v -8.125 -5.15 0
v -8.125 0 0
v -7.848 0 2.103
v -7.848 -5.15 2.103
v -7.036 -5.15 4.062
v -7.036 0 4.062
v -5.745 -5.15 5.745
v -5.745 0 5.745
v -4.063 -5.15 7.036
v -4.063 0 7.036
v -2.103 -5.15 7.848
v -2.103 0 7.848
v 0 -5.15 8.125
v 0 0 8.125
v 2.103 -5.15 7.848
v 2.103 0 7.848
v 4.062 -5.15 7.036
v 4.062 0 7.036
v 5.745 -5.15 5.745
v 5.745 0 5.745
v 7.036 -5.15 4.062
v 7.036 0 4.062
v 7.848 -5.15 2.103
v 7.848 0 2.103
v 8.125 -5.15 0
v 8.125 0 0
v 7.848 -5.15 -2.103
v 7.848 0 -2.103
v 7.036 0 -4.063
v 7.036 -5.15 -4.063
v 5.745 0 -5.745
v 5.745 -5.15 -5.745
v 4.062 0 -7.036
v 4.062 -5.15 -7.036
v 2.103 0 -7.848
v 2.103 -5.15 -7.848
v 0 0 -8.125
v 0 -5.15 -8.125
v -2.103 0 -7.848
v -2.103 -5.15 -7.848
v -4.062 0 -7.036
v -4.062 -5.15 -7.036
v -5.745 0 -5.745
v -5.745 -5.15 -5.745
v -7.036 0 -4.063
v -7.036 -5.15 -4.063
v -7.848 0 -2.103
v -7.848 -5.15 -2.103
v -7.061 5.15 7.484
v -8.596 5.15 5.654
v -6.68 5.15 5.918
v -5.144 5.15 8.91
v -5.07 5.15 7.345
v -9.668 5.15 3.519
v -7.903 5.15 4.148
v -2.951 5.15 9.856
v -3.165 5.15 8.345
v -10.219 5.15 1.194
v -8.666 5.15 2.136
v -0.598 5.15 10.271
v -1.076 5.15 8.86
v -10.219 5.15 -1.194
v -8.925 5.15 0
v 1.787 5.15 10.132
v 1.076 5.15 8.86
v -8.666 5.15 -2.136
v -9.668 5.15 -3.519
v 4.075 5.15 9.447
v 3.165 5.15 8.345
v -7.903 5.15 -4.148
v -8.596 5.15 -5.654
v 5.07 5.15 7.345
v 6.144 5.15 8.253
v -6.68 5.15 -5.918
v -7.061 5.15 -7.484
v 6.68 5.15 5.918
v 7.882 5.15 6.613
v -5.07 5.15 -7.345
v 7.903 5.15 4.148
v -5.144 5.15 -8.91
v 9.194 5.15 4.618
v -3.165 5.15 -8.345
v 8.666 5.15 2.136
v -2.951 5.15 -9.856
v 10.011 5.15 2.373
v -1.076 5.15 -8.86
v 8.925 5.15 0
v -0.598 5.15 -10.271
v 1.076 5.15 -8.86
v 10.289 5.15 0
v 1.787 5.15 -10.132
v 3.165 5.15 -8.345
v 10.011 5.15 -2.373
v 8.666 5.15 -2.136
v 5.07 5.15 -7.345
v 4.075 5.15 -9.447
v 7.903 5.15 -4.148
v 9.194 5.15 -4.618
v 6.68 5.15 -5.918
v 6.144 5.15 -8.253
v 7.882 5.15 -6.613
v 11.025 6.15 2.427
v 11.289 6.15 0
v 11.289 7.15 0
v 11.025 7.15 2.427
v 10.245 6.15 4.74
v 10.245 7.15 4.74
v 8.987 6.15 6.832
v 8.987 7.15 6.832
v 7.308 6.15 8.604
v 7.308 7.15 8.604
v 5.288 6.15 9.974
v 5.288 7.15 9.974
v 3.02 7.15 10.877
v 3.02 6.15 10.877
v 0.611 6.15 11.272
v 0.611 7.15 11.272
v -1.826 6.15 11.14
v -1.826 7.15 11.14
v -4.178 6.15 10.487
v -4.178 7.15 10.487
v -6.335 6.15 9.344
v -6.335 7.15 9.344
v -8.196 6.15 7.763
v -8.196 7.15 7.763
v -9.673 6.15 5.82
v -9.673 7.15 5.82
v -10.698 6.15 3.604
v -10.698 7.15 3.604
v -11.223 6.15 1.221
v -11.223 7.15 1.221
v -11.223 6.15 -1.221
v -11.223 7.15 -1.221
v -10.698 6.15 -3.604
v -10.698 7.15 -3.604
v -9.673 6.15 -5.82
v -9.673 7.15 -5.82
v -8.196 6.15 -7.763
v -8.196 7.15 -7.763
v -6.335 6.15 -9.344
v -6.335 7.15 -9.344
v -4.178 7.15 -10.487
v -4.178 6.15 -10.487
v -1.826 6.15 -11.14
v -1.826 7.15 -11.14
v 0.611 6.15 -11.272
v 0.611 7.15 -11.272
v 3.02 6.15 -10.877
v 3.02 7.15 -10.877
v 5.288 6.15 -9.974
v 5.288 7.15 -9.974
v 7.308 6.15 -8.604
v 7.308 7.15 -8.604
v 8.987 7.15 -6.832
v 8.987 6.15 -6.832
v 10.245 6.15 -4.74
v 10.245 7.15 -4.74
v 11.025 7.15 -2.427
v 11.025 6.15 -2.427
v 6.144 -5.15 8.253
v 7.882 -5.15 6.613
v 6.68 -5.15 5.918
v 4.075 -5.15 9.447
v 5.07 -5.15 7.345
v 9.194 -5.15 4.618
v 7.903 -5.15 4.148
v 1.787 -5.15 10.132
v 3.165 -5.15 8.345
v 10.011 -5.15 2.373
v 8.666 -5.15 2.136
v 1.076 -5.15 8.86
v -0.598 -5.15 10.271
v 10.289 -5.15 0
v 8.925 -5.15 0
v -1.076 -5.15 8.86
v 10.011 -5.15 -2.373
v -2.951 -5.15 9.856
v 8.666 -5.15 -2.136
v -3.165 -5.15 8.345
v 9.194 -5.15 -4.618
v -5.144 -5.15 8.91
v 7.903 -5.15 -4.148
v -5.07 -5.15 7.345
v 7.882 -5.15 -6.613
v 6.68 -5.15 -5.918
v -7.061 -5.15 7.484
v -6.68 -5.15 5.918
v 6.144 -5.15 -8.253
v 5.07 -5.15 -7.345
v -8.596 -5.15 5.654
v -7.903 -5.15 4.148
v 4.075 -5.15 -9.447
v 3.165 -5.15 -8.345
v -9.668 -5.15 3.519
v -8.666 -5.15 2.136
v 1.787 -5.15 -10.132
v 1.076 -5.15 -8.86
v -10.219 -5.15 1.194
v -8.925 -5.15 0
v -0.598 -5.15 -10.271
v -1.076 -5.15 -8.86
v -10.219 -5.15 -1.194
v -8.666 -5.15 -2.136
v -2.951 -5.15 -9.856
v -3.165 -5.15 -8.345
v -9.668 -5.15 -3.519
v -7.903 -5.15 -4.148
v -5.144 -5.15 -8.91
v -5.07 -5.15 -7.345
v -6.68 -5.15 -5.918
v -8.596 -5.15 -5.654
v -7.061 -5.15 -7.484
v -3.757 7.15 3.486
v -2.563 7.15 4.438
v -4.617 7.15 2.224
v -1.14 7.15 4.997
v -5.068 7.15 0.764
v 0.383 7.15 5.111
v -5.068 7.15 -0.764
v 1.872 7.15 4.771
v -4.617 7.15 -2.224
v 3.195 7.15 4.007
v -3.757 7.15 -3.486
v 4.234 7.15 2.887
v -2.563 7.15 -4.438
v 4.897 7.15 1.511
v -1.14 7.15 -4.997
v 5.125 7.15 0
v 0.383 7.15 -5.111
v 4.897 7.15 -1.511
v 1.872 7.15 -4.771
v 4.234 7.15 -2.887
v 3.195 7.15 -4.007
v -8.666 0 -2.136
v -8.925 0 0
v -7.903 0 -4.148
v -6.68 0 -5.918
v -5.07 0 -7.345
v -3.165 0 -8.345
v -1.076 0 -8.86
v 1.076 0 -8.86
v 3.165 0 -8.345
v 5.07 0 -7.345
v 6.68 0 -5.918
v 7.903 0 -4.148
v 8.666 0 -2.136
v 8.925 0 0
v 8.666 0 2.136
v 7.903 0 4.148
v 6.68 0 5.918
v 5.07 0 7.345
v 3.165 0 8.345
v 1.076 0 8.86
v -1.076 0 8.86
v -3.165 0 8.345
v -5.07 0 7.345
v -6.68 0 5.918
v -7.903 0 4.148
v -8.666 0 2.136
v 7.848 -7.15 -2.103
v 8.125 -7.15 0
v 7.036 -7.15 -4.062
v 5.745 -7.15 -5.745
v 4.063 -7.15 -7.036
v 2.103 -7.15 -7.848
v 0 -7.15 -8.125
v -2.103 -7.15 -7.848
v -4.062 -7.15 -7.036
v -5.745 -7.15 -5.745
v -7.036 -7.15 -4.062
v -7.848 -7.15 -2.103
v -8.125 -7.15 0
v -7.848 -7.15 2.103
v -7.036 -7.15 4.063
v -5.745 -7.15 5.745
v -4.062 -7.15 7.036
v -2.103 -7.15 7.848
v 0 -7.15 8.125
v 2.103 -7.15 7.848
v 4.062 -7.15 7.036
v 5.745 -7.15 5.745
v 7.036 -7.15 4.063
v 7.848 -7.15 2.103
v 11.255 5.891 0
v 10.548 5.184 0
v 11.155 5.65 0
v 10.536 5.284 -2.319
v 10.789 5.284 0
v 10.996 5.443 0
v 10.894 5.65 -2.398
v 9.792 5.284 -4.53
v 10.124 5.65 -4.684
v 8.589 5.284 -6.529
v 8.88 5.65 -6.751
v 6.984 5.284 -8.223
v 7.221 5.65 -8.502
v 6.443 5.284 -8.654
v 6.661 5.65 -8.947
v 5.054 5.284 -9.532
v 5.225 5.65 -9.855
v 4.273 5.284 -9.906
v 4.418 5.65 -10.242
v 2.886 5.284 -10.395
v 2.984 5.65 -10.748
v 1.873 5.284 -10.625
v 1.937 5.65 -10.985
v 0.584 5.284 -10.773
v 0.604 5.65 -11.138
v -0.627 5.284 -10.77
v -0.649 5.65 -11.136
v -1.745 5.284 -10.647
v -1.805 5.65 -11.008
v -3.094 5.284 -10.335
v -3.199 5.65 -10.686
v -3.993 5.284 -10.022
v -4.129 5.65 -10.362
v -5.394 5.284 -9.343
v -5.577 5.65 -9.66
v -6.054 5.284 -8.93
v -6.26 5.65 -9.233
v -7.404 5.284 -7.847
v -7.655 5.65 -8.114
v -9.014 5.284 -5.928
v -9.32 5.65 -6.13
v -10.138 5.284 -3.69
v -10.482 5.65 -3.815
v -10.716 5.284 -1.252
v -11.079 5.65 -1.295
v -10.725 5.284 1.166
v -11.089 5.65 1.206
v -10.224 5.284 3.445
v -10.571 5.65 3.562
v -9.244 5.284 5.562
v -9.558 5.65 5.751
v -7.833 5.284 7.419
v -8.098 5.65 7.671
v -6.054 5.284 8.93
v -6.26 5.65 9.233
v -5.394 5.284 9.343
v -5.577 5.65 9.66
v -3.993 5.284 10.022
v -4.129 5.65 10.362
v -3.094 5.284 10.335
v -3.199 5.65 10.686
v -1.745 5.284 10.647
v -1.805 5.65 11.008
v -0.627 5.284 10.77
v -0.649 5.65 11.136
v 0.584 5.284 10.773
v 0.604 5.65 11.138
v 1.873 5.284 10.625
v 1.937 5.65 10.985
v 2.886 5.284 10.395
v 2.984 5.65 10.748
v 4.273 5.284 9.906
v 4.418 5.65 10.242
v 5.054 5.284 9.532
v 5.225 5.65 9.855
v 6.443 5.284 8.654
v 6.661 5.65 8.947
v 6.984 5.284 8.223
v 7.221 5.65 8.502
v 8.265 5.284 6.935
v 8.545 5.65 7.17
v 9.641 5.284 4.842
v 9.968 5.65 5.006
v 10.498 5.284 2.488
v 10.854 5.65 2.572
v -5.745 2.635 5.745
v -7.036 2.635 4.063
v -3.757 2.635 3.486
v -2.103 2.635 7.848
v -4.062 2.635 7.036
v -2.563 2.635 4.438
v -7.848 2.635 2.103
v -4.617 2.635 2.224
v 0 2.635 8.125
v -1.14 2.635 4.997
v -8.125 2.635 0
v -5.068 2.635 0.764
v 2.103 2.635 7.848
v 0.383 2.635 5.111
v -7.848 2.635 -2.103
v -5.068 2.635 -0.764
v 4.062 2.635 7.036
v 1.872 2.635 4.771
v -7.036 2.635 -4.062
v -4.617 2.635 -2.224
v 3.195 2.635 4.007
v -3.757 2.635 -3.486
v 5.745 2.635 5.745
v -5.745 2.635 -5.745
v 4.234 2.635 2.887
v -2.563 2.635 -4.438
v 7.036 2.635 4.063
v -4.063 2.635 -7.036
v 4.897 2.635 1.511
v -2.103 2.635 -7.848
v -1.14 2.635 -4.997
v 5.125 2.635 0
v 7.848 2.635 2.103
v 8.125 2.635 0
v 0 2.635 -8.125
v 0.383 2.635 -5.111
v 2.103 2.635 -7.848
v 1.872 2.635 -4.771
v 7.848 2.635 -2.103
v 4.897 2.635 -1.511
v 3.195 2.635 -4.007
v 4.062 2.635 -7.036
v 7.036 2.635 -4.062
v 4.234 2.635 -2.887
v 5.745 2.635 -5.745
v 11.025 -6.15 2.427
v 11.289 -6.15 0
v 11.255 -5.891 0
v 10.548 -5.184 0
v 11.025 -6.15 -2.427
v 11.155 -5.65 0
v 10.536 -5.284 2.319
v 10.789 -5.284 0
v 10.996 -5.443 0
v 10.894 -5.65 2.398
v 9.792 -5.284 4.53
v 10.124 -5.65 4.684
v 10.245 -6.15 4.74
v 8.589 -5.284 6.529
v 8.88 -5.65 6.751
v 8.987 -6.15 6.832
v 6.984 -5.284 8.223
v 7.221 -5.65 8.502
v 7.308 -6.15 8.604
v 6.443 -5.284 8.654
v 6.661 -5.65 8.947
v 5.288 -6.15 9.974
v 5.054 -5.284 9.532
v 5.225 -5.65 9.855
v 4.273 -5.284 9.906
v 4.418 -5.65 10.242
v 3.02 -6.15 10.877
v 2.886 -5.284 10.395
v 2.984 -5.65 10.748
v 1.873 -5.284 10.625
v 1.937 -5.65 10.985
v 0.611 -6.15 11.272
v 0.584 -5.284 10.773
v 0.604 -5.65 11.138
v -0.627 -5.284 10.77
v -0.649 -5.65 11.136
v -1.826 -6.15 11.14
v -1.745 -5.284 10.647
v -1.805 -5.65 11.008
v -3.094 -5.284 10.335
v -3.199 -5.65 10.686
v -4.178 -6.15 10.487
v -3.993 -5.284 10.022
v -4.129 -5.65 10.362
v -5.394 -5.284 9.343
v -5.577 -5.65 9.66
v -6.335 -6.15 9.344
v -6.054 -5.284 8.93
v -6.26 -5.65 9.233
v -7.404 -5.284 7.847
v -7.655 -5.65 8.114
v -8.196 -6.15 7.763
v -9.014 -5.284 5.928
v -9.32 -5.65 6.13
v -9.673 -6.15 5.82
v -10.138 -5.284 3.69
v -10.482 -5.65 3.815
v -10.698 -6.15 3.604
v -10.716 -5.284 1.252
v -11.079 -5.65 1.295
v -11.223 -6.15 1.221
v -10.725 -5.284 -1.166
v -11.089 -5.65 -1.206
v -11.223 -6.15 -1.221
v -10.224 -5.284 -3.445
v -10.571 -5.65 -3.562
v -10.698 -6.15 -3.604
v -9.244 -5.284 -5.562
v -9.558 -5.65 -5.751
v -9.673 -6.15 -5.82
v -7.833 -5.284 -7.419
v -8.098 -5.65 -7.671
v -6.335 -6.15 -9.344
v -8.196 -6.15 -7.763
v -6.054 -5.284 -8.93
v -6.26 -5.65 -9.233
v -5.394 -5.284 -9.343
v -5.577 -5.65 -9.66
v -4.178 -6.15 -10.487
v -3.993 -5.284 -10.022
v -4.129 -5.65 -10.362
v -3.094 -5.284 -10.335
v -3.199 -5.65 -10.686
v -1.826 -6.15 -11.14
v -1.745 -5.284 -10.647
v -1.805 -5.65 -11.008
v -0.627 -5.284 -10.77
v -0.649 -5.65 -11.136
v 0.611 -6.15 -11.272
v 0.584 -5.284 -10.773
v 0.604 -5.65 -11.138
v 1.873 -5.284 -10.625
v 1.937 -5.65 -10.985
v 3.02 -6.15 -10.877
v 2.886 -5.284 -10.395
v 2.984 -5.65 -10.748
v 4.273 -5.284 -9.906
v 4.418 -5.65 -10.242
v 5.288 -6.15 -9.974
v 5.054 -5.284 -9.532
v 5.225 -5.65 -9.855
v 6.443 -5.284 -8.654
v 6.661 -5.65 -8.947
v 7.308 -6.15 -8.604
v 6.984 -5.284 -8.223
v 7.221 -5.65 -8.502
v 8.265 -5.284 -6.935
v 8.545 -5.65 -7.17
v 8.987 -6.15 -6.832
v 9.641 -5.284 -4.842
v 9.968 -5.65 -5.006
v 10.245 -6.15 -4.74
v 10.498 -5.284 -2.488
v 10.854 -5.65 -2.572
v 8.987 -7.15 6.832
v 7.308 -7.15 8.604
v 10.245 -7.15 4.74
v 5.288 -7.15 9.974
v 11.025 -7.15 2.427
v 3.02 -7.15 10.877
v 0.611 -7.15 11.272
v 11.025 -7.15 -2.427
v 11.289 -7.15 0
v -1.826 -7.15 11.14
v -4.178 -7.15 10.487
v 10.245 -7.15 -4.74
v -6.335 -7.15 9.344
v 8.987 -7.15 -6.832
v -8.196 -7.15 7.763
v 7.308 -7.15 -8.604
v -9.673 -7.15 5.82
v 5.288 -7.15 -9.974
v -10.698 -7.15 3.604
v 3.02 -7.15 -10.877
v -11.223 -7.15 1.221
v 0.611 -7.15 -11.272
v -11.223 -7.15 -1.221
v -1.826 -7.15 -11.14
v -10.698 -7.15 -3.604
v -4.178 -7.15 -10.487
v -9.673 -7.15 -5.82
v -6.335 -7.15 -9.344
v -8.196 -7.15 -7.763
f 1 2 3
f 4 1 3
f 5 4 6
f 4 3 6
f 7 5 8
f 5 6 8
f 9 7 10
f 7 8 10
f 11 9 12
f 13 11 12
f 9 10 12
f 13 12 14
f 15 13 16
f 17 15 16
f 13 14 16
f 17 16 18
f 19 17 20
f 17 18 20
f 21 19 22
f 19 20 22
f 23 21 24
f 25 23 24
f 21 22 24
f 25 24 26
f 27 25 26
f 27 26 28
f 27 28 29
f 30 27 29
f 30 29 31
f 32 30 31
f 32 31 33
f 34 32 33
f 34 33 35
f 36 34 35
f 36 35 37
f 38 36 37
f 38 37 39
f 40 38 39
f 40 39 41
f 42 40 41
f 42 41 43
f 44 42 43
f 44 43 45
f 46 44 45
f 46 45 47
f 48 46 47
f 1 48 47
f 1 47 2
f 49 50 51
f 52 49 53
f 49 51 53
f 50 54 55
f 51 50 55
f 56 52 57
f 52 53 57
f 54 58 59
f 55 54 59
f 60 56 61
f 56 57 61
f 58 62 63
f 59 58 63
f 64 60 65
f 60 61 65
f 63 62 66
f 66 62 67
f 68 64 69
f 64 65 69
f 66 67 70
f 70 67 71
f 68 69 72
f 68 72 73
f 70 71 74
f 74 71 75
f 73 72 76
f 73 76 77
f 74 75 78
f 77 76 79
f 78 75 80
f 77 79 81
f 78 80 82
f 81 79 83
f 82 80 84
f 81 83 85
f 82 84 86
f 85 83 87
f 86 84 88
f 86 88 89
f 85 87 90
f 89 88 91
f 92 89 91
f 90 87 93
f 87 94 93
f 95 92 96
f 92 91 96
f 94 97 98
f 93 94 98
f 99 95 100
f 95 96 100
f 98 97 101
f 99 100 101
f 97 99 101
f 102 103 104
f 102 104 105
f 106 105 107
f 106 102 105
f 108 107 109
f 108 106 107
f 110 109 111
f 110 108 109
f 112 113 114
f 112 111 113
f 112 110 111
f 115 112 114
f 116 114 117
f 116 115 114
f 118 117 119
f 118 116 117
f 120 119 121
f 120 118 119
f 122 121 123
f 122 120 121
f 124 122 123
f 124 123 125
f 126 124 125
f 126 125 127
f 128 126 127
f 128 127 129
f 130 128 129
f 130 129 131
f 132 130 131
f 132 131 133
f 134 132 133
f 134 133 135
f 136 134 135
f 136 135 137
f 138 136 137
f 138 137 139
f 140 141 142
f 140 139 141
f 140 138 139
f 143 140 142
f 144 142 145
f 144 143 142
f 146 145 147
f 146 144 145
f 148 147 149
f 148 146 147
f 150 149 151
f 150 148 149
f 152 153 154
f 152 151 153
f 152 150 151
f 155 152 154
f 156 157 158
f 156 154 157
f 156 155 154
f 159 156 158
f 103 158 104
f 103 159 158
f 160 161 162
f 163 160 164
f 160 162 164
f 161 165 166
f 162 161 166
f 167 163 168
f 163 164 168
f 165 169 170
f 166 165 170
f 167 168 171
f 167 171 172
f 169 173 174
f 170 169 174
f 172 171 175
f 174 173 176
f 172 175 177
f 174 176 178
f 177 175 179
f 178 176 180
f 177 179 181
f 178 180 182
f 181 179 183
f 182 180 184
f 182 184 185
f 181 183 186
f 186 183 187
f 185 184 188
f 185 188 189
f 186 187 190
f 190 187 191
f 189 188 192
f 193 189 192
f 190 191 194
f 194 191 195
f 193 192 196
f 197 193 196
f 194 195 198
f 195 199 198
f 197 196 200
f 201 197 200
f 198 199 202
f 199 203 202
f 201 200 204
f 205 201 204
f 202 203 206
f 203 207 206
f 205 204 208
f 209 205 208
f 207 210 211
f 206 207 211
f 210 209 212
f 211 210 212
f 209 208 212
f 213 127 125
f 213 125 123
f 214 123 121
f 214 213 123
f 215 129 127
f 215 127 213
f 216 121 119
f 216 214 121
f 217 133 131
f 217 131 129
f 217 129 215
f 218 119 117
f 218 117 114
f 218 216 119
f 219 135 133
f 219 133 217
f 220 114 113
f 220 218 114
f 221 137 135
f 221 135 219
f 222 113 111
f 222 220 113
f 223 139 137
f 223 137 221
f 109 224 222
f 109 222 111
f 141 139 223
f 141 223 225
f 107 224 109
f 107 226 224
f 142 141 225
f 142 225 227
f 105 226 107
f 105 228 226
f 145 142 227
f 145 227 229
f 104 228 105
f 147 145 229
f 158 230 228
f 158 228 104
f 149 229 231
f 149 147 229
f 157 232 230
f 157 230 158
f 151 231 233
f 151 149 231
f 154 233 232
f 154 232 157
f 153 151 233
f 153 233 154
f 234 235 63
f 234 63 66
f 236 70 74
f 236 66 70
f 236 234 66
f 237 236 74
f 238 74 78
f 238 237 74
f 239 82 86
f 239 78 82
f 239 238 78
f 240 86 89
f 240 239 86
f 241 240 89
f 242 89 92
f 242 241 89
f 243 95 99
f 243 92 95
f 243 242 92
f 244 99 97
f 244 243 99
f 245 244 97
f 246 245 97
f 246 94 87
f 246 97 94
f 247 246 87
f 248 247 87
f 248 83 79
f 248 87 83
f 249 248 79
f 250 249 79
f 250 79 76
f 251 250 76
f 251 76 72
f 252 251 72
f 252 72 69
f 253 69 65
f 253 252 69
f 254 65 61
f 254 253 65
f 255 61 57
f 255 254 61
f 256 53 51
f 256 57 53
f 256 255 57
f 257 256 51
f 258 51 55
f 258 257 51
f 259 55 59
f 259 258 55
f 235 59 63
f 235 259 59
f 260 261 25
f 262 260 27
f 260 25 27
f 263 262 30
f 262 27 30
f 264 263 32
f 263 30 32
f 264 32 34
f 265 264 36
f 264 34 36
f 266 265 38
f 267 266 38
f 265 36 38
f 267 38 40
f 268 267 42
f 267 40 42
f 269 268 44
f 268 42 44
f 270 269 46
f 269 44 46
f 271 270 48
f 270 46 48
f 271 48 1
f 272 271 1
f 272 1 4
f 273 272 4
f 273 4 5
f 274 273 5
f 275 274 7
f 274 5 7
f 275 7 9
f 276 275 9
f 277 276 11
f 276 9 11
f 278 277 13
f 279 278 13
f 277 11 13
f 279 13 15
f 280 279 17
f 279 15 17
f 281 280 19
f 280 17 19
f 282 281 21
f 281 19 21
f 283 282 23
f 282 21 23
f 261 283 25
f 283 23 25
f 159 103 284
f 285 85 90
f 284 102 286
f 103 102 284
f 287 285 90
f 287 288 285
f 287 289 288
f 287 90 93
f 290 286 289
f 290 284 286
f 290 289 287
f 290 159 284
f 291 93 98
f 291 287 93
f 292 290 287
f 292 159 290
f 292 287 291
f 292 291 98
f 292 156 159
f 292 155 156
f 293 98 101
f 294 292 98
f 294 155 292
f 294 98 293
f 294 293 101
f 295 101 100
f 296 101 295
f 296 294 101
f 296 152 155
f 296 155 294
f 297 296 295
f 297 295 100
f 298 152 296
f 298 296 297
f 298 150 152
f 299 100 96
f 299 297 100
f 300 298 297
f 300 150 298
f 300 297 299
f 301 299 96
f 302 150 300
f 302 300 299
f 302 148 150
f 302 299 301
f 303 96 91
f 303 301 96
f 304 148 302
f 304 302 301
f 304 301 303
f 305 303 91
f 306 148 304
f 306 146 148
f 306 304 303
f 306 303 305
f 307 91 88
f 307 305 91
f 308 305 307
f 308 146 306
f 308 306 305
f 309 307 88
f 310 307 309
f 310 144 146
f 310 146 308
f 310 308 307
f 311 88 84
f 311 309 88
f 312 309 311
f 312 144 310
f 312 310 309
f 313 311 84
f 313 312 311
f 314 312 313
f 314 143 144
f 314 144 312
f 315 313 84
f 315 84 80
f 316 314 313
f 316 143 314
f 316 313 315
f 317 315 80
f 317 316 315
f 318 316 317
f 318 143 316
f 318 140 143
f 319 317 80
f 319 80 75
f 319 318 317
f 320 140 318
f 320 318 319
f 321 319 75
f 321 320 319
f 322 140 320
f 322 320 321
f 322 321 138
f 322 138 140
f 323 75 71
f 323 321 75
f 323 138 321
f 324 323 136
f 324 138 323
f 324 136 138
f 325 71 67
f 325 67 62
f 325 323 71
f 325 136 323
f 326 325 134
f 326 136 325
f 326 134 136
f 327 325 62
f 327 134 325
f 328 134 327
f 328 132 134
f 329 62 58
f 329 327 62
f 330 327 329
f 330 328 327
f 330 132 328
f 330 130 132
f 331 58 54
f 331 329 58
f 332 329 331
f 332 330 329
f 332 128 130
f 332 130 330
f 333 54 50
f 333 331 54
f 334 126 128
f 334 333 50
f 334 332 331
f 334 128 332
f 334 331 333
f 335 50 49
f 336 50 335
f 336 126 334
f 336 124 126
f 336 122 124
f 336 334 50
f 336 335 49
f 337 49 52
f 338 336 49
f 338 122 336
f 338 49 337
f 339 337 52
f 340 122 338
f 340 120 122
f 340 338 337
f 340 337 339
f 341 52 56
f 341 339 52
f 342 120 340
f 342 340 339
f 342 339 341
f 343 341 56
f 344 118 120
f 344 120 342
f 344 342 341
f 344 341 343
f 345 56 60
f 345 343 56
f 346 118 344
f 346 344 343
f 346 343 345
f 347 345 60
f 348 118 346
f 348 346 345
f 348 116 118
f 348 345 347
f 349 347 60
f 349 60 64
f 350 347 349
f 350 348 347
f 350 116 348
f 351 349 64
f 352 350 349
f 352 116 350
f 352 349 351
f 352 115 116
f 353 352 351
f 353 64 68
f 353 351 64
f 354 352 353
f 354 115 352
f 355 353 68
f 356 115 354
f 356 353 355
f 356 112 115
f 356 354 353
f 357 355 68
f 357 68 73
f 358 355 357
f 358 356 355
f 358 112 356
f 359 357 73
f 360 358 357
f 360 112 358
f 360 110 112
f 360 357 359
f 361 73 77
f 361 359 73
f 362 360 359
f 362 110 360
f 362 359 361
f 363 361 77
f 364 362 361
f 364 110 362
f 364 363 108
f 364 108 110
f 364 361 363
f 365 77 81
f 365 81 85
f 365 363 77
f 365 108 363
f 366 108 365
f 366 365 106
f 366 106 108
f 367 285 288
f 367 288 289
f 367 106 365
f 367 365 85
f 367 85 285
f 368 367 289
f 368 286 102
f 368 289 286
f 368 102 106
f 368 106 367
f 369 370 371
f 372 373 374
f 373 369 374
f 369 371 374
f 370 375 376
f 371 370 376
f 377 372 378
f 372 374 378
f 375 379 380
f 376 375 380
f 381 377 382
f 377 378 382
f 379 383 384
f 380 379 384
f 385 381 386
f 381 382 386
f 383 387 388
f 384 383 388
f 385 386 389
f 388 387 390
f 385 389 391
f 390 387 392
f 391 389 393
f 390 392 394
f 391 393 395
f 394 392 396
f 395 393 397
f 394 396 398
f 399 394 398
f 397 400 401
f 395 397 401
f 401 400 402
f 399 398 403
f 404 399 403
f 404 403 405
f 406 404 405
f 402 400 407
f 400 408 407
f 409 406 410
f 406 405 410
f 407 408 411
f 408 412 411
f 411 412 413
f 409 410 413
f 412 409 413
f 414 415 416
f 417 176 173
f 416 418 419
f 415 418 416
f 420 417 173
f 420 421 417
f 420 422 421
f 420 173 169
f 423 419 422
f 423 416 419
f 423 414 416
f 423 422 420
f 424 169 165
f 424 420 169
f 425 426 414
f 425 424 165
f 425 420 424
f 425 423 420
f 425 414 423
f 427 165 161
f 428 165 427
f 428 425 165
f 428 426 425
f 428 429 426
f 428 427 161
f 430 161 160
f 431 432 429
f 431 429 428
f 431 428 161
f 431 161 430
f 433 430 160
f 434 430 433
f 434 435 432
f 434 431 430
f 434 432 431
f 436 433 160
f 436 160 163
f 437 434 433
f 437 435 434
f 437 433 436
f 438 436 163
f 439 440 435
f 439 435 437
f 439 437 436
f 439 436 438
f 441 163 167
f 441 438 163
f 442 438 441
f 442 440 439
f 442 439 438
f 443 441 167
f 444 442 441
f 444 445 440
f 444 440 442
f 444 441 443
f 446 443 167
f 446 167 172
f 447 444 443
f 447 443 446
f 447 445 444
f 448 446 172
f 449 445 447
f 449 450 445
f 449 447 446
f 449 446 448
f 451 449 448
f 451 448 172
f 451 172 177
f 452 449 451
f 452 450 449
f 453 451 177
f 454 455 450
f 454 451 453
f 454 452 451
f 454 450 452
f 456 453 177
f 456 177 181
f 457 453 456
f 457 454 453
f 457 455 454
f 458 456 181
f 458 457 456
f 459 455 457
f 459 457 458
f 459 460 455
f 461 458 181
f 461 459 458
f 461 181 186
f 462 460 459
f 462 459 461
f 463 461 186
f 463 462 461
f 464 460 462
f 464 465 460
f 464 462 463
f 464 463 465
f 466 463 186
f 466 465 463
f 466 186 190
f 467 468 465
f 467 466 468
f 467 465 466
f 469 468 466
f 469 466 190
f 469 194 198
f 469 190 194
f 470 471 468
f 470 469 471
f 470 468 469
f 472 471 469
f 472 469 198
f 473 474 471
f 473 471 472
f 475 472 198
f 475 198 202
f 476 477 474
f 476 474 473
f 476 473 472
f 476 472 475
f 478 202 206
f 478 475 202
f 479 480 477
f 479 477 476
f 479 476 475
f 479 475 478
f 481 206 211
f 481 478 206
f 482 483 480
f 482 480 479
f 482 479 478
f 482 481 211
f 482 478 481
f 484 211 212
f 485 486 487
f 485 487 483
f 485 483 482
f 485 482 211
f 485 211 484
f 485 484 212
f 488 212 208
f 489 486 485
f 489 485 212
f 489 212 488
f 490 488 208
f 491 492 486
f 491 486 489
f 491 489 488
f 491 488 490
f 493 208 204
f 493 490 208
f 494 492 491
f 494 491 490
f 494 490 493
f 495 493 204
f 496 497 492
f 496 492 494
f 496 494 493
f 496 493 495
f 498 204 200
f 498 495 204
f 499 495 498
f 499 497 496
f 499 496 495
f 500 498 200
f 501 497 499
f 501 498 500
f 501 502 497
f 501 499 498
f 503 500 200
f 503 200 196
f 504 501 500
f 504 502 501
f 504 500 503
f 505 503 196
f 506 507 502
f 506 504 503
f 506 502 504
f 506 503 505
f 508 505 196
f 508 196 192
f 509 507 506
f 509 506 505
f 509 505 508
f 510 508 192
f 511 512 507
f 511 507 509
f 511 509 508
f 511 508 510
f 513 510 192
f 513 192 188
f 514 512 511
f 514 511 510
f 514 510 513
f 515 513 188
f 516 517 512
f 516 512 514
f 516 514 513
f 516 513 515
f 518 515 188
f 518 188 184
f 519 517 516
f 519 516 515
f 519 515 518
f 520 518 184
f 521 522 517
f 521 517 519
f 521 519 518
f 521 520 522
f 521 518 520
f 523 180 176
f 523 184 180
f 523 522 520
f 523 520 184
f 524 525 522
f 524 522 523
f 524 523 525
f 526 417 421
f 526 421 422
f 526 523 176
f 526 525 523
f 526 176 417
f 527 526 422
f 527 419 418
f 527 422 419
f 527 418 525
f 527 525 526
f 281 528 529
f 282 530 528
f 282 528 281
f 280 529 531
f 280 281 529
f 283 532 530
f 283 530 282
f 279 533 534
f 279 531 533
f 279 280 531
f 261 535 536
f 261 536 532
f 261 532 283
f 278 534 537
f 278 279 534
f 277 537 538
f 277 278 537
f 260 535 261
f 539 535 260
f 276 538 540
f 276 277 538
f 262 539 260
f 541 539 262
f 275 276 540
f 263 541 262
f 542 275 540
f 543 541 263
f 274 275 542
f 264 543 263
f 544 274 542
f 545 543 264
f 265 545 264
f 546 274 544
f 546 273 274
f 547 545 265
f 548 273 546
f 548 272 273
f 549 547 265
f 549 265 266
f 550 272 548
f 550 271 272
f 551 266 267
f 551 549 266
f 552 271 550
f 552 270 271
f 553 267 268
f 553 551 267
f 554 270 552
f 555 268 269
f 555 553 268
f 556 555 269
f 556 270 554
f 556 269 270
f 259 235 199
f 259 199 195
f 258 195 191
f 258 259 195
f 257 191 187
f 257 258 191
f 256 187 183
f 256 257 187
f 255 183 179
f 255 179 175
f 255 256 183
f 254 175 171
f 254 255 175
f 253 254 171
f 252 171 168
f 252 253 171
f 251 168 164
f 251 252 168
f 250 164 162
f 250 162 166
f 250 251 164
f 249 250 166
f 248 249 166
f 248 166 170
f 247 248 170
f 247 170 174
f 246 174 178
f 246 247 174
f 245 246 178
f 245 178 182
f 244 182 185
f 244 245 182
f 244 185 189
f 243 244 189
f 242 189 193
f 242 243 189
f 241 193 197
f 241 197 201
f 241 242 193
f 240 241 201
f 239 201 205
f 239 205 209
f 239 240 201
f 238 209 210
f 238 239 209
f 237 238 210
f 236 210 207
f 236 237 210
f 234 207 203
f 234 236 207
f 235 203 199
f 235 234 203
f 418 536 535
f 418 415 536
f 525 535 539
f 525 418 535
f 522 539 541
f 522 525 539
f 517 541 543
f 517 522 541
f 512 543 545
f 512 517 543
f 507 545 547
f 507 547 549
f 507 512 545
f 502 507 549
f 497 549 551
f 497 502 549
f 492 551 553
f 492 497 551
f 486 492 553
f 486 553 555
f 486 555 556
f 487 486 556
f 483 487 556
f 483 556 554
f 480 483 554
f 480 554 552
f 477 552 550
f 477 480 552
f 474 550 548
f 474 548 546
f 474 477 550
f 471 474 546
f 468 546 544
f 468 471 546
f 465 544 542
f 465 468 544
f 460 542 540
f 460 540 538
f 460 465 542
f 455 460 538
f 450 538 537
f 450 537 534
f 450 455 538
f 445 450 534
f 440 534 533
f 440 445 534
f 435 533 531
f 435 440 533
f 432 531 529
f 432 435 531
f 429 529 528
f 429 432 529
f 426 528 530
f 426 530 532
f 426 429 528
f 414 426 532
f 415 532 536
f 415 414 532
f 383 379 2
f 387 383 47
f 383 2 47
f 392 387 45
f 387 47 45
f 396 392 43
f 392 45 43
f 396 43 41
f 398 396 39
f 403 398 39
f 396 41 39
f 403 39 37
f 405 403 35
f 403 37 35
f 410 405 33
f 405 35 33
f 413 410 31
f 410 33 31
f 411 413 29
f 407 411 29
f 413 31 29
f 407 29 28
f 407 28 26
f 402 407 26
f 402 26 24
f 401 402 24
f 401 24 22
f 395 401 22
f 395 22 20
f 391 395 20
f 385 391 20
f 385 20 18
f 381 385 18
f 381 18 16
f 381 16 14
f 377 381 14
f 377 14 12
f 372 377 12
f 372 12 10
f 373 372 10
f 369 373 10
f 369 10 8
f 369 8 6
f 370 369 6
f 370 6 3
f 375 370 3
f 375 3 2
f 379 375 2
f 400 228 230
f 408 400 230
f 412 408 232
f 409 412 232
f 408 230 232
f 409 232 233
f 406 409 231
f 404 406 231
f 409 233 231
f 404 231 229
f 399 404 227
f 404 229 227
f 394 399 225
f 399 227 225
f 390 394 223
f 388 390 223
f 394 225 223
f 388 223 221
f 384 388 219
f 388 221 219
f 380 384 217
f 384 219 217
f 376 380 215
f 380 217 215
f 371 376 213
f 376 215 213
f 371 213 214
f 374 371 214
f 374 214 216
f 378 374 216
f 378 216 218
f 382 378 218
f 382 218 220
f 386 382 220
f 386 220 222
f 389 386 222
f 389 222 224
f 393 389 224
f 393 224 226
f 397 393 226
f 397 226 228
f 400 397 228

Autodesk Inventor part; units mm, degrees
ref_plane "YZ Plane" through (0, 0, 0) normal (1, 0, 0) x (0, 1, 0)
ref_plane "XZ Plane" through (0, 0, 0) normal (0, 1, 0) x (-1, 0, 0)
ref_plane "XY Plane" through (0, 0, 0) normal (0, 0, 1) x (1, 0, 0)
sketch "Boceto1" plane through (0, 0, 0) normal (0, 1, 0) x (-1, 0, 0)
  circle A0 centre (0, 0) radius 8.125
  circle A1 centre (0, 0) radius 8.925
  dimension "d0" = 16.25
  dimension "d1" = 0.8
extrude "Extrusión1" add sketch "Boceto1" along normal mid plane 10.3
sketch "Boceto2" plane through (0, 5.15, 0) normal (0, 1, 0) x (1, 0, 0)
  circle A0 centre (0, 0) radius 11.2887
  circle A1 centre (0, 0) radius 8.925 projected
  circle A2 centre (0, 0) radius 8.125 projected
extrude "Extrusión2" add sketch "Boceto2" along normal blind 2 contours A0 | A1
fillet "Empalme1" radius 1 1 edges at (-11.2887, 5.15, 0)
mirror "Simetría1" about plane through (0, 0, 0) normal (0, 1, 0) of "Extrusión2", "Empalme1"
sketch "Boceto3" plane through (0, 7.15, 0) normal (0, 1, 0) x (1, 0, 0)
  circle A0 centre (0, 0) radius 8.125 projected
  circle A1 centre (0, 0) radius 5.125
  dimension "d7" = 10.25
extrude "Extrusión3" add sketch "Boceto3" against normal blind 4.515
properties part number "Roller"
